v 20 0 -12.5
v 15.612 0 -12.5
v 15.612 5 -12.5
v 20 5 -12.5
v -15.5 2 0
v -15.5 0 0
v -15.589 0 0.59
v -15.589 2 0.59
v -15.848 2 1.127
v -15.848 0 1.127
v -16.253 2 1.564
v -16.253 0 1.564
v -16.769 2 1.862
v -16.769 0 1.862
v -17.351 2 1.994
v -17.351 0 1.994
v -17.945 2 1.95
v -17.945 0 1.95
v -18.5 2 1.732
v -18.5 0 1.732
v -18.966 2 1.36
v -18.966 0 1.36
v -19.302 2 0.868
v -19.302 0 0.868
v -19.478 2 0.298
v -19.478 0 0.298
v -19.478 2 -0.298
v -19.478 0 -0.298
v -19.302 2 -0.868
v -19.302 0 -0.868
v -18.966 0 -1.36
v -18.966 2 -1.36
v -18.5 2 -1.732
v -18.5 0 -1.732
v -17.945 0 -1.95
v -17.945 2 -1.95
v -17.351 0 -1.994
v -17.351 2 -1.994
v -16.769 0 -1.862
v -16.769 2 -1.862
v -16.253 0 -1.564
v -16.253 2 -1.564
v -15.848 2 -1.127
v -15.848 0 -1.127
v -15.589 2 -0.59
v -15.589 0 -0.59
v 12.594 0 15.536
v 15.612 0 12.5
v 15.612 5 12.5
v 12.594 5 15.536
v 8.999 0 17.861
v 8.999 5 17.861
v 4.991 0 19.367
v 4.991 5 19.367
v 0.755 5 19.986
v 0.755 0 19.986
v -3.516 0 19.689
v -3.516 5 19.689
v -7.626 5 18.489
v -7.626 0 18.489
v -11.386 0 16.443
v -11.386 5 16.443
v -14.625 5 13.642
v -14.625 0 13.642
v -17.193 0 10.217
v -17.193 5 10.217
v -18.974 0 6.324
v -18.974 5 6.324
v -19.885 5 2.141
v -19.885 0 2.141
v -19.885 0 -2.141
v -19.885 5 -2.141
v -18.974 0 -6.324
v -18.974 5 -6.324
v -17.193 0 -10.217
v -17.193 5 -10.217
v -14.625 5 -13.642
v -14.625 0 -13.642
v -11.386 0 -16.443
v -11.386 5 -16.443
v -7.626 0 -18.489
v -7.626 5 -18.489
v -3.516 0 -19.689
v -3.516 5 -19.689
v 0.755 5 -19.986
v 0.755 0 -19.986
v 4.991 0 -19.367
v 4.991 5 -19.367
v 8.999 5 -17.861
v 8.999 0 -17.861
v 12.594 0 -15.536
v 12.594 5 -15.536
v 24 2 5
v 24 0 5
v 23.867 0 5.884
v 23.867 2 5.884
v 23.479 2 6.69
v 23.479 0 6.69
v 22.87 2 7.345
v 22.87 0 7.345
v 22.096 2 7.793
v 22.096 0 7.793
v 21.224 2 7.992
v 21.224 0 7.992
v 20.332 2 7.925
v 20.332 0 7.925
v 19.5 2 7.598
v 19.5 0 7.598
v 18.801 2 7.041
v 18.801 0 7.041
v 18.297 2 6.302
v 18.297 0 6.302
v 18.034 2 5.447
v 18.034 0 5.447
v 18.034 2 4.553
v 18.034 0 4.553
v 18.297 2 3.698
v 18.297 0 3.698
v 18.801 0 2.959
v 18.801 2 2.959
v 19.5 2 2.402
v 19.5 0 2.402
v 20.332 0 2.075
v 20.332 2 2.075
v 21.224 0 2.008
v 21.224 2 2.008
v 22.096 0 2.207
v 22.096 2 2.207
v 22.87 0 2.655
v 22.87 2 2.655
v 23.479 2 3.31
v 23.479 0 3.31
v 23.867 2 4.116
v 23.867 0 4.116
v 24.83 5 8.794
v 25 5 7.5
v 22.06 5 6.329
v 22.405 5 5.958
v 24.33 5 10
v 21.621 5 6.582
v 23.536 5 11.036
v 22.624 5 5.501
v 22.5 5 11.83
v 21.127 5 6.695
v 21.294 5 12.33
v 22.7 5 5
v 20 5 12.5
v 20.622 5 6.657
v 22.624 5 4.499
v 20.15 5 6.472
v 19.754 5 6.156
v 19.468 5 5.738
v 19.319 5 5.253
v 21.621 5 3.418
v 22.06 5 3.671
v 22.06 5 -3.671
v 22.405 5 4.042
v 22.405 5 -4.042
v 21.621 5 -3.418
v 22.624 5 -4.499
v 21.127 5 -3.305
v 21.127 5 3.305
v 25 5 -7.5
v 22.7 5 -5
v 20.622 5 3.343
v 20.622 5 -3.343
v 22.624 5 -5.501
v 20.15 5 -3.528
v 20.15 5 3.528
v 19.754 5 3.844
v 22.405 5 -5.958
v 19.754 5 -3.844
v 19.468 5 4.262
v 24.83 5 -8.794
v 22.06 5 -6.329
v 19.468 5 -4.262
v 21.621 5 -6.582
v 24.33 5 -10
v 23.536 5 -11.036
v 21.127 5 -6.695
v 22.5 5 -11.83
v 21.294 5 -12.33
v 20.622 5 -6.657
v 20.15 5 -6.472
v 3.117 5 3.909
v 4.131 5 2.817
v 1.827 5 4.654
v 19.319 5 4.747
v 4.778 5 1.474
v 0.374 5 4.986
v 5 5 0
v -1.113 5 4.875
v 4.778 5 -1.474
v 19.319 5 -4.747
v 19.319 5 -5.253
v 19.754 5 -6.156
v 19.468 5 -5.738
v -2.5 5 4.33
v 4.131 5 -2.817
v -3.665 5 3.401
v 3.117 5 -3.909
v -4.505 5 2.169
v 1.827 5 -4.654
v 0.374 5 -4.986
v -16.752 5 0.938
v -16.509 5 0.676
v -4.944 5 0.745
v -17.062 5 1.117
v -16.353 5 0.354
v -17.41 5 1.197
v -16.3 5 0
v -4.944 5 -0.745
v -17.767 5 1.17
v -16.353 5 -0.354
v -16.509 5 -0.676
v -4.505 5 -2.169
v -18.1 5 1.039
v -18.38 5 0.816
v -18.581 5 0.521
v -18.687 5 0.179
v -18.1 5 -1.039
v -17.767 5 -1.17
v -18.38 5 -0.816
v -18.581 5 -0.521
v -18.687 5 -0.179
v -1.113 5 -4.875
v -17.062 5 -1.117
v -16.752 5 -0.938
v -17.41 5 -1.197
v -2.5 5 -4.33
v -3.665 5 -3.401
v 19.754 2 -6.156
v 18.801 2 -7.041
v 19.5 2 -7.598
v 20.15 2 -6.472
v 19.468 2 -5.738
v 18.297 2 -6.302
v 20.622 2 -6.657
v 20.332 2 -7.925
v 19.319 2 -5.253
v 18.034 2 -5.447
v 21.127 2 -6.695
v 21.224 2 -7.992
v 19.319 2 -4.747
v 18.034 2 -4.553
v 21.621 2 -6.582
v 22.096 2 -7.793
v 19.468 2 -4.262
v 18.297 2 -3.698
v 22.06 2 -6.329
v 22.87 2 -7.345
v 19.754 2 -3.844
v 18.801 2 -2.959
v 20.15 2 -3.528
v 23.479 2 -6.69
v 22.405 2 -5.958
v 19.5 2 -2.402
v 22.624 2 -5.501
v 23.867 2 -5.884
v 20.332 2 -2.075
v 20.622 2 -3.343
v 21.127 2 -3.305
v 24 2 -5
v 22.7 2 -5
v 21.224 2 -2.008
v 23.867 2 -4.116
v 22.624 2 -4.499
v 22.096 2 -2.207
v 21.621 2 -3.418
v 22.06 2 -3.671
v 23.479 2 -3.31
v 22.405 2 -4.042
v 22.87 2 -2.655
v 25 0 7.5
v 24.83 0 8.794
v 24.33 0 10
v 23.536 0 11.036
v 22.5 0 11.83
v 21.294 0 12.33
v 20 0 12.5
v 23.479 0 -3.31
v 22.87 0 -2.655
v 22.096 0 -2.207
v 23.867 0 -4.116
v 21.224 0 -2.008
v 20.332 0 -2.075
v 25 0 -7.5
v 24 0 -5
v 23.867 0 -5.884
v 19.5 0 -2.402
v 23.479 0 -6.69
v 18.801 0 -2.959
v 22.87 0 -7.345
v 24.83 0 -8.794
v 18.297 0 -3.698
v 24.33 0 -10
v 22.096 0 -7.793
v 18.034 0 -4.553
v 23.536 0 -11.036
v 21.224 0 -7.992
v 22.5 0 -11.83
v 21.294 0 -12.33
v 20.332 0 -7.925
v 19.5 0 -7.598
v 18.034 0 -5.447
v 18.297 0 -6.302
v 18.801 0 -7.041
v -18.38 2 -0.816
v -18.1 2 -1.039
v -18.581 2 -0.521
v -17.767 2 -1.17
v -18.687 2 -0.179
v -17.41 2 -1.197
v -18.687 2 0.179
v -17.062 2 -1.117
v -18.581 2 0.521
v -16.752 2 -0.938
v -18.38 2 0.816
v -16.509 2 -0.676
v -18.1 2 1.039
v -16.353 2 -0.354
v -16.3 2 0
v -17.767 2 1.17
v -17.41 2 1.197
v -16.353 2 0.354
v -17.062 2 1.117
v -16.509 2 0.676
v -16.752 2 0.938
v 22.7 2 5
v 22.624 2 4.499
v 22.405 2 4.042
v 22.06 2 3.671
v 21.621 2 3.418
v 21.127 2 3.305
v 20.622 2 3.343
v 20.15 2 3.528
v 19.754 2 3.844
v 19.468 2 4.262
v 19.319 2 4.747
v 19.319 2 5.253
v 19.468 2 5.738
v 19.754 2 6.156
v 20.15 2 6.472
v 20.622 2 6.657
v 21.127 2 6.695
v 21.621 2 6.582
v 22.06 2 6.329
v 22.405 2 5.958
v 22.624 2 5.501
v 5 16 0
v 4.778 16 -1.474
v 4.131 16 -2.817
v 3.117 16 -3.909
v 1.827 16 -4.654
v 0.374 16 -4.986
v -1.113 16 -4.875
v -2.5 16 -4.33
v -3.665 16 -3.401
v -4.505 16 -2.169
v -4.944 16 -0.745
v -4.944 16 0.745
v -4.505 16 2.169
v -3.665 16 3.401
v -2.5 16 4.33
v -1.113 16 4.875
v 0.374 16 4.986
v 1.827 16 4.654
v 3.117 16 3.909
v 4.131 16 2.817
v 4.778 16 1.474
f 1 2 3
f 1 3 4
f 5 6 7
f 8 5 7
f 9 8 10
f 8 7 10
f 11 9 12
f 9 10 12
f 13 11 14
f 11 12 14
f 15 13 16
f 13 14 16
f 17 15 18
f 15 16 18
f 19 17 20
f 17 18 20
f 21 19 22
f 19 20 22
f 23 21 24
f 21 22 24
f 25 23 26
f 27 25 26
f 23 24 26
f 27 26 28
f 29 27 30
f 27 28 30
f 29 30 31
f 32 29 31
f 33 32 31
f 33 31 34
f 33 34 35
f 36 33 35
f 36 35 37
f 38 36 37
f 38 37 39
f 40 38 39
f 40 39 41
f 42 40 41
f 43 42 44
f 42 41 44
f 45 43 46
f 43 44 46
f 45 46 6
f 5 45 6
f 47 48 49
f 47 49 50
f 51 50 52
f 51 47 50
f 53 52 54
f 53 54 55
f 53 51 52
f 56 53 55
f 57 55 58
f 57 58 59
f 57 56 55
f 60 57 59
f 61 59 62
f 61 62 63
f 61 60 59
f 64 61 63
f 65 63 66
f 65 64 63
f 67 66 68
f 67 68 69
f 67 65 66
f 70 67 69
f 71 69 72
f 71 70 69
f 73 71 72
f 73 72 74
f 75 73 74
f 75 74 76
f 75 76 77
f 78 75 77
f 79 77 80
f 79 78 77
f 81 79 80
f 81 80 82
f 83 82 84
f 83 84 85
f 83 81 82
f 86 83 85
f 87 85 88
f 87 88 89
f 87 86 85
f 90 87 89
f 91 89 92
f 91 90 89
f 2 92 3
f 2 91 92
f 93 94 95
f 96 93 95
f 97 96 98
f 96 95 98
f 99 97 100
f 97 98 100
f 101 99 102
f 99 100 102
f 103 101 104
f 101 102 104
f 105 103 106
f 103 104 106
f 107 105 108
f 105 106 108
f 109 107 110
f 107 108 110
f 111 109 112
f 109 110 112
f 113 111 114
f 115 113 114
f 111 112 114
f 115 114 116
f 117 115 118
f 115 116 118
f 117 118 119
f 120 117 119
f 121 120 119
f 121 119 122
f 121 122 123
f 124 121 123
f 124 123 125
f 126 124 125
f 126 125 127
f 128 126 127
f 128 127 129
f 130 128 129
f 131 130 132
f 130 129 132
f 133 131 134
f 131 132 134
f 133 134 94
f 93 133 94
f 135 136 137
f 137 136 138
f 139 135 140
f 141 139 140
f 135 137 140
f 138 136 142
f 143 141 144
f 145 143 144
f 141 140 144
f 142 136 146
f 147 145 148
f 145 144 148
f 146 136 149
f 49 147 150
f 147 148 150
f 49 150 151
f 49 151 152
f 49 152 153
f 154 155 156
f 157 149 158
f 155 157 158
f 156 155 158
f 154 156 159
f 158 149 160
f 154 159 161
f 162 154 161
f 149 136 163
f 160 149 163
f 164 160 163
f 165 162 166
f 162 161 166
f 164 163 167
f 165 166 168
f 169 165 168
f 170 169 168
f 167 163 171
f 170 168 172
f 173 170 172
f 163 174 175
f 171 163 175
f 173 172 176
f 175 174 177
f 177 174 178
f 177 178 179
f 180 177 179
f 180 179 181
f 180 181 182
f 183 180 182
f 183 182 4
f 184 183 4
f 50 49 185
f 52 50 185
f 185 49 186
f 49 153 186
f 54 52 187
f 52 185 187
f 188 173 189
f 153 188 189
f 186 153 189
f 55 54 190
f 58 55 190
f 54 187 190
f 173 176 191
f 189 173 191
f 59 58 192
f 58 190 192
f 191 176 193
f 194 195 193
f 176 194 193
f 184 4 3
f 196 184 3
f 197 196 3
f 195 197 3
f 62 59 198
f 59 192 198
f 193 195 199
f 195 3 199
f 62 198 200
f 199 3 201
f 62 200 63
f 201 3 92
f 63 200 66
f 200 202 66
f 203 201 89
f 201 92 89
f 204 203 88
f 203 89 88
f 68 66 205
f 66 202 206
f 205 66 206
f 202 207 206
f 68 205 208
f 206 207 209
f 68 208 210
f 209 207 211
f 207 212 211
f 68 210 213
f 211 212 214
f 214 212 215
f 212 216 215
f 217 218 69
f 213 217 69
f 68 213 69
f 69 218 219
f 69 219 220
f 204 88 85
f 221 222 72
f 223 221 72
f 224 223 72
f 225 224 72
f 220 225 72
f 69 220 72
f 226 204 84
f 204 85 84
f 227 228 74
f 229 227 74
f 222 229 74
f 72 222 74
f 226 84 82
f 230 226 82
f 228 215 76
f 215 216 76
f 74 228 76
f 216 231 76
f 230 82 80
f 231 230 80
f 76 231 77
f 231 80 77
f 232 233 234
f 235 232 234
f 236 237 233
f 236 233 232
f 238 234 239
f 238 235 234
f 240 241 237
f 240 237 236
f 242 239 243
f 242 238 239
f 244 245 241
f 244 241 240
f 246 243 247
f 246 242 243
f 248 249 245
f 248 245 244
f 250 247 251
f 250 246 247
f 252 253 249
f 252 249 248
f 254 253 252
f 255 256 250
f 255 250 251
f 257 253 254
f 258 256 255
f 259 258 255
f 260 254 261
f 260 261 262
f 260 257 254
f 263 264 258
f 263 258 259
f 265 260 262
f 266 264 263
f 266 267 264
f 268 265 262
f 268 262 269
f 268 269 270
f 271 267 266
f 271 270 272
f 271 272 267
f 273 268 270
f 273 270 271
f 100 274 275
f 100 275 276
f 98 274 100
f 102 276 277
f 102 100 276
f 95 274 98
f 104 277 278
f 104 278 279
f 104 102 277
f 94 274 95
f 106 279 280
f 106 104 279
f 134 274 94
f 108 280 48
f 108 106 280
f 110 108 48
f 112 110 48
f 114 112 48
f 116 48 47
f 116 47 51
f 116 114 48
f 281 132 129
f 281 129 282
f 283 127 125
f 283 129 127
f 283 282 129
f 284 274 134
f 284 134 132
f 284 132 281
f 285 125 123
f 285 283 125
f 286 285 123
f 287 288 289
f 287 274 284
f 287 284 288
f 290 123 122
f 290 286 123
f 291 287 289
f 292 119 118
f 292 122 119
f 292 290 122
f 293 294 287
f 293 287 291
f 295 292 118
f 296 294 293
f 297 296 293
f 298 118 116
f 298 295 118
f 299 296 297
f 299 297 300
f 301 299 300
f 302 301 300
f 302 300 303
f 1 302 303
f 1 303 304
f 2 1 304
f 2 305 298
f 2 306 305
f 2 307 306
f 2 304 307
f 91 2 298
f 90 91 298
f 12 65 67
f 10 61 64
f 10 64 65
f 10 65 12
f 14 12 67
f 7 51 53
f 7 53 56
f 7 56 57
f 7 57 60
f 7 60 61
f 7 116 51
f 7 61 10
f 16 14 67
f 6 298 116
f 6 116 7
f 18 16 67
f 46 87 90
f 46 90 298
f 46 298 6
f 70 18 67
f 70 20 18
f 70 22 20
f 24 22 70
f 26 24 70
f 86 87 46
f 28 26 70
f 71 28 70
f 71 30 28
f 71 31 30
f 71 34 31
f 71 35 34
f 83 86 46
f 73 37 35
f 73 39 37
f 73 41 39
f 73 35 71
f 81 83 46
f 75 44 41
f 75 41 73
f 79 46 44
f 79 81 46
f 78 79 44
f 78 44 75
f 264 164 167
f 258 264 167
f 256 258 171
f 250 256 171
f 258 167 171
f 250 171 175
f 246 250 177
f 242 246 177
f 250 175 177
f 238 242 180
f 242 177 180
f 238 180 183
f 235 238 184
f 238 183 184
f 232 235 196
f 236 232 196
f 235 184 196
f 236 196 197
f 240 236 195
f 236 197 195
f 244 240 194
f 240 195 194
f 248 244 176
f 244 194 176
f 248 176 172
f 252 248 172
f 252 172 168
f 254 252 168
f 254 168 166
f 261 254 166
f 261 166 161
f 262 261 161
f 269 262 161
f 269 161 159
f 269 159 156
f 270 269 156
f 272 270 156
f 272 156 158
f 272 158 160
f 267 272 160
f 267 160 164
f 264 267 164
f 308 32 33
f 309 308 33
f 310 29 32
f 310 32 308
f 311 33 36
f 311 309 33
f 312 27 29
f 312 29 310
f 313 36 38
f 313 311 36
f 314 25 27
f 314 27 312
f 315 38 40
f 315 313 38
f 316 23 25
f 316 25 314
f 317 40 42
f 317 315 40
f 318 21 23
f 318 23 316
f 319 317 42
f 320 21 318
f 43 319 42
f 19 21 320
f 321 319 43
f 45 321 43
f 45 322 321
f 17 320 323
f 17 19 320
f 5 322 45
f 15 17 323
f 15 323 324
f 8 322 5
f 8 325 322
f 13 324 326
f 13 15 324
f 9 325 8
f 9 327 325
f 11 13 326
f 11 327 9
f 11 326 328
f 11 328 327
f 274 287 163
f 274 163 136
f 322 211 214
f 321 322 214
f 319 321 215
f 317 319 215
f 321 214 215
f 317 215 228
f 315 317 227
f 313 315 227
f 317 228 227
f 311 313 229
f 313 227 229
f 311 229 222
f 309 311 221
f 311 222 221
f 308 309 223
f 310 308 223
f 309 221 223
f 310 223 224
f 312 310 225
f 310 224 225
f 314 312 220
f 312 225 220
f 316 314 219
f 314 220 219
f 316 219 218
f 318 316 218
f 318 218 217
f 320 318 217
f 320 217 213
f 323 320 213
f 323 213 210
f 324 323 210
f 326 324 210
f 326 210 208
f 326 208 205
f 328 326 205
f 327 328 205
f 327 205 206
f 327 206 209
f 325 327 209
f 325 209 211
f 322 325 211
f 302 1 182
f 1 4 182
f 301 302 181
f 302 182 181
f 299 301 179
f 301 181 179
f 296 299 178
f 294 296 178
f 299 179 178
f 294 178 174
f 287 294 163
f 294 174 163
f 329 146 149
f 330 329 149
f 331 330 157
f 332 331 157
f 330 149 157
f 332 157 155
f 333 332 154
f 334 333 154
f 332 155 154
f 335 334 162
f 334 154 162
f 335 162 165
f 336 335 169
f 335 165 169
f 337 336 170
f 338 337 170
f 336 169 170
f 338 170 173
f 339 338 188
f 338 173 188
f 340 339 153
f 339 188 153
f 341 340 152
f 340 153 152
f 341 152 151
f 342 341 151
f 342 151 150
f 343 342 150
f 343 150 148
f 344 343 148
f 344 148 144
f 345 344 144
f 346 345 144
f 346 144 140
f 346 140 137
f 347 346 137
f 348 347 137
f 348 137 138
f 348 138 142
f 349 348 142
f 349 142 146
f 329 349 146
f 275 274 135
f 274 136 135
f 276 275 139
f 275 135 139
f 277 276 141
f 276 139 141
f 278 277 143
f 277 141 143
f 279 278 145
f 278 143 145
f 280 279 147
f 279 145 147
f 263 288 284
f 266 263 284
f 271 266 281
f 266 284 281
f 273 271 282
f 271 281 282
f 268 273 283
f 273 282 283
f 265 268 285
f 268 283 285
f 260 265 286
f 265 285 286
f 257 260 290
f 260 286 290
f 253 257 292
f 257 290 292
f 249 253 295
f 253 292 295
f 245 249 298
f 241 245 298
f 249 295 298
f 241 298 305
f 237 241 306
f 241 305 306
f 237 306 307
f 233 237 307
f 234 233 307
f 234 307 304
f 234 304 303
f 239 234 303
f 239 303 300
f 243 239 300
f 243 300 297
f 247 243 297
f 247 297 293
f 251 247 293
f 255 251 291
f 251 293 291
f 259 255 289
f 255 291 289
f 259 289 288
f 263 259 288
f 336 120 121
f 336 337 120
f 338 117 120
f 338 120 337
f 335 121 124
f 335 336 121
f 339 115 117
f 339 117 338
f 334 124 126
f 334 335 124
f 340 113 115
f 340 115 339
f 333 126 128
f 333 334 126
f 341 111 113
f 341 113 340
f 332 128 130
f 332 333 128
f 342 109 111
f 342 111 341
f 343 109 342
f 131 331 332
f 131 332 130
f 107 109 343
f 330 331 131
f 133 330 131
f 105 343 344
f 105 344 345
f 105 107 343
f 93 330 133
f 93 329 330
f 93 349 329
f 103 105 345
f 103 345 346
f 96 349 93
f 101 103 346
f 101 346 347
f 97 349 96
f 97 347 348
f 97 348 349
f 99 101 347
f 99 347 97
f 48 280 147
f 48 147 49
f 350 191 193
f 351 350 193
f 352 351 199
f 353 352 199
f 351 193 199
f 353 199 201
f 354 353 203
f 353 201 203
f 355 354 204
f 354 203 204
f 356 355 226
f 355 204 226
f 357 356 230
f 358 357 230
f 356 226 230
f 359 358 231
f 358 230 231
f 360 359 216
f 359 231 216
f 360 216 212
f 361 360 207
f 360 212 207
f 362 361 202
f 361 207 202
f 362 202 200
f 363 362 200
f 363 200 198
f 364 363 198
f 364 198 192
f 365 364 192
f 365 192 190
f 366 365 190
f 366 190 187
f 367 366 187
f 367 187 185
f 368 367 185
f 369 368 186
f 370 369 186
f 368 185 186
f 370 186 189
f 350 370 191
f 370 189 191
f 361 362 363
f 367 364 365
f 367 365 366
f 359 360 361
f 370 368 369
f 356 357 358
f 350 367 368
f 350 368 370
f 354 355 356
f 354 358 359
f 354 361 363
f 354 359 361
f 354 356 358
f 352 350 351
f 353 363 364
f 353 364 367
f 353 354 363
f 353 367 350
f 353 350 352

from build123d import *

# Parameters (mm, degrees)
EXTRUDE_1_DEPTH     = 5
SKETCH_2_R          = 5
EXTRUDE_2_DEPTH     = 11
CUT_EXTRUDE_1_REACH = 7
SKETCH_3_R          = 1.2
SKETCH_3_R_2        = 1.7
SKETCH_4_R          = 2
SKETCH_4_R_2        = 3
CUT_EXTRUDE_2_DEPTH = 2
FILLET_1_R          = 5


with BuildPart() as part:
    # 스케치1 → 보스-돌출1 (new body)
    with BuildSketch(Plane(origin=(0, 0, 0), x_dir=(1, 0, 0), z_dir=(0, 1, 0))):
        with BuildLine():
            Line((15.612494996, 12.5), (25, 12.5))
            Line((25, 12.5), (25, -12.5))
            Line((25, -12.5), (15.612494996, -12.5))
            ThreePointArc((15.612494996, -12.5), (-20, 0), (15.612494996, 12.5))
        make_face()
    extrude(amount=EXTRUDE_1_DEPTH)

    # 스케치2 → 보스-돌출2 (add)
    with BuildSketch(Plane(origin=(0, 5, 0), x_dir=(1, 0, 0), z_dir=(0, 1, 0))):
        Circle(SKETCH_2_R)
    extrude(amount=EXTRUDE_2_DEPTH)

    # 스케치3 → 컷-돌출1 (cut, up to next)
    with BuildSketch(Plane(origin=(0, 5, 0), x_dir=(1, 0, 0), z_dir=(0, 1, 0)), mode=Mode.PRIVATE) as cut_extrude_1_sk1:
        with Locations((-17.5, 0)):
            Circle(SKETCH_3_R)
    cut_extrude_1_tool1 = extrude(cut_extrude_1_sk1.sketch, amount=-CUT_EXTRUDE_1_REACH, mode=Mode.PRIVATE) & part.part
    add(cut_extrude_1_tool1.solids().sort_by_distance((-17.5, 5, 0))[0], mode=Mode.SUBTRACT)
    # 스케치3 → 컷-돌출1 (cut, up to next)
    with BuildSketch(Plane(origin=(0, 5, 0), x_dir=(1, 0, 0), z_dir=(0, 1, 0)), mode=Mode.PRIVATE) as cut_extrude_1_sk2:
        with Locations((21, 5)):
            Circle(SKETCH_3_R_2)
    cut_extrude_1_tool2 = extrude(cut_extrude_1_sk2.sketch, amount=-CUT_EXTRUDE_1_REACH, mode=Mode.PRIVATE) & part.part
    add(cut_extrude_1_tool2.solids().sort_by_distance((21, 5, -5))[0], mode=Mode.SUBTRACT)
    # 스케치3 → 컷-돌출1 (cut, up to next)
    with BuildSketch(Plane(origin=(0, 5, 0), x_dir=(1, 0, 0), z_dir=(0, 1, 0)), mode=Mode.PRIVATE) as cut_extrude_1_sk3:
        with Locations((21, -5)):
            Circle(SKETCH_3_R_2)
    cut_extrude_1_tool3 = extrude(cut_extrude_1_sk3.sketch, amount=-CUT_EXTRUDE_1_REACH, mode=Mode.PRIVATE) & part.part
    add(cut_extrude_1_tool3.solids().sort_by_distance((21, 5, 5))[0], mode=Mode.SUBTRACT)

    # 스케치4 → 컷-돌출2 (cut)
    with BuildSketch(Plane.XZ):
        with Locations((-17.5, 0)):
            Circle(SKETCH_4_R)
        with Locations((21, 5)):
            Circle(SKETCH_4_R_2)
        with Locations((21, -5)):
            Circle(SKETCH_4_R_2)
    extrude(amount=-CUT_EXTRUDE_2_DEPTH, mode=Mode.SUBTRACT)

    # 필렛1
    fillet_1_edges = [part.edges().sort_by_distance(p)[0] for p in [
        (25, 2.5, 12.5),
        (25, 2.5, -12.5),
    ]]
    fillet(fillet_1_edges, radius=FILLET_1_R)


solid = part.part
